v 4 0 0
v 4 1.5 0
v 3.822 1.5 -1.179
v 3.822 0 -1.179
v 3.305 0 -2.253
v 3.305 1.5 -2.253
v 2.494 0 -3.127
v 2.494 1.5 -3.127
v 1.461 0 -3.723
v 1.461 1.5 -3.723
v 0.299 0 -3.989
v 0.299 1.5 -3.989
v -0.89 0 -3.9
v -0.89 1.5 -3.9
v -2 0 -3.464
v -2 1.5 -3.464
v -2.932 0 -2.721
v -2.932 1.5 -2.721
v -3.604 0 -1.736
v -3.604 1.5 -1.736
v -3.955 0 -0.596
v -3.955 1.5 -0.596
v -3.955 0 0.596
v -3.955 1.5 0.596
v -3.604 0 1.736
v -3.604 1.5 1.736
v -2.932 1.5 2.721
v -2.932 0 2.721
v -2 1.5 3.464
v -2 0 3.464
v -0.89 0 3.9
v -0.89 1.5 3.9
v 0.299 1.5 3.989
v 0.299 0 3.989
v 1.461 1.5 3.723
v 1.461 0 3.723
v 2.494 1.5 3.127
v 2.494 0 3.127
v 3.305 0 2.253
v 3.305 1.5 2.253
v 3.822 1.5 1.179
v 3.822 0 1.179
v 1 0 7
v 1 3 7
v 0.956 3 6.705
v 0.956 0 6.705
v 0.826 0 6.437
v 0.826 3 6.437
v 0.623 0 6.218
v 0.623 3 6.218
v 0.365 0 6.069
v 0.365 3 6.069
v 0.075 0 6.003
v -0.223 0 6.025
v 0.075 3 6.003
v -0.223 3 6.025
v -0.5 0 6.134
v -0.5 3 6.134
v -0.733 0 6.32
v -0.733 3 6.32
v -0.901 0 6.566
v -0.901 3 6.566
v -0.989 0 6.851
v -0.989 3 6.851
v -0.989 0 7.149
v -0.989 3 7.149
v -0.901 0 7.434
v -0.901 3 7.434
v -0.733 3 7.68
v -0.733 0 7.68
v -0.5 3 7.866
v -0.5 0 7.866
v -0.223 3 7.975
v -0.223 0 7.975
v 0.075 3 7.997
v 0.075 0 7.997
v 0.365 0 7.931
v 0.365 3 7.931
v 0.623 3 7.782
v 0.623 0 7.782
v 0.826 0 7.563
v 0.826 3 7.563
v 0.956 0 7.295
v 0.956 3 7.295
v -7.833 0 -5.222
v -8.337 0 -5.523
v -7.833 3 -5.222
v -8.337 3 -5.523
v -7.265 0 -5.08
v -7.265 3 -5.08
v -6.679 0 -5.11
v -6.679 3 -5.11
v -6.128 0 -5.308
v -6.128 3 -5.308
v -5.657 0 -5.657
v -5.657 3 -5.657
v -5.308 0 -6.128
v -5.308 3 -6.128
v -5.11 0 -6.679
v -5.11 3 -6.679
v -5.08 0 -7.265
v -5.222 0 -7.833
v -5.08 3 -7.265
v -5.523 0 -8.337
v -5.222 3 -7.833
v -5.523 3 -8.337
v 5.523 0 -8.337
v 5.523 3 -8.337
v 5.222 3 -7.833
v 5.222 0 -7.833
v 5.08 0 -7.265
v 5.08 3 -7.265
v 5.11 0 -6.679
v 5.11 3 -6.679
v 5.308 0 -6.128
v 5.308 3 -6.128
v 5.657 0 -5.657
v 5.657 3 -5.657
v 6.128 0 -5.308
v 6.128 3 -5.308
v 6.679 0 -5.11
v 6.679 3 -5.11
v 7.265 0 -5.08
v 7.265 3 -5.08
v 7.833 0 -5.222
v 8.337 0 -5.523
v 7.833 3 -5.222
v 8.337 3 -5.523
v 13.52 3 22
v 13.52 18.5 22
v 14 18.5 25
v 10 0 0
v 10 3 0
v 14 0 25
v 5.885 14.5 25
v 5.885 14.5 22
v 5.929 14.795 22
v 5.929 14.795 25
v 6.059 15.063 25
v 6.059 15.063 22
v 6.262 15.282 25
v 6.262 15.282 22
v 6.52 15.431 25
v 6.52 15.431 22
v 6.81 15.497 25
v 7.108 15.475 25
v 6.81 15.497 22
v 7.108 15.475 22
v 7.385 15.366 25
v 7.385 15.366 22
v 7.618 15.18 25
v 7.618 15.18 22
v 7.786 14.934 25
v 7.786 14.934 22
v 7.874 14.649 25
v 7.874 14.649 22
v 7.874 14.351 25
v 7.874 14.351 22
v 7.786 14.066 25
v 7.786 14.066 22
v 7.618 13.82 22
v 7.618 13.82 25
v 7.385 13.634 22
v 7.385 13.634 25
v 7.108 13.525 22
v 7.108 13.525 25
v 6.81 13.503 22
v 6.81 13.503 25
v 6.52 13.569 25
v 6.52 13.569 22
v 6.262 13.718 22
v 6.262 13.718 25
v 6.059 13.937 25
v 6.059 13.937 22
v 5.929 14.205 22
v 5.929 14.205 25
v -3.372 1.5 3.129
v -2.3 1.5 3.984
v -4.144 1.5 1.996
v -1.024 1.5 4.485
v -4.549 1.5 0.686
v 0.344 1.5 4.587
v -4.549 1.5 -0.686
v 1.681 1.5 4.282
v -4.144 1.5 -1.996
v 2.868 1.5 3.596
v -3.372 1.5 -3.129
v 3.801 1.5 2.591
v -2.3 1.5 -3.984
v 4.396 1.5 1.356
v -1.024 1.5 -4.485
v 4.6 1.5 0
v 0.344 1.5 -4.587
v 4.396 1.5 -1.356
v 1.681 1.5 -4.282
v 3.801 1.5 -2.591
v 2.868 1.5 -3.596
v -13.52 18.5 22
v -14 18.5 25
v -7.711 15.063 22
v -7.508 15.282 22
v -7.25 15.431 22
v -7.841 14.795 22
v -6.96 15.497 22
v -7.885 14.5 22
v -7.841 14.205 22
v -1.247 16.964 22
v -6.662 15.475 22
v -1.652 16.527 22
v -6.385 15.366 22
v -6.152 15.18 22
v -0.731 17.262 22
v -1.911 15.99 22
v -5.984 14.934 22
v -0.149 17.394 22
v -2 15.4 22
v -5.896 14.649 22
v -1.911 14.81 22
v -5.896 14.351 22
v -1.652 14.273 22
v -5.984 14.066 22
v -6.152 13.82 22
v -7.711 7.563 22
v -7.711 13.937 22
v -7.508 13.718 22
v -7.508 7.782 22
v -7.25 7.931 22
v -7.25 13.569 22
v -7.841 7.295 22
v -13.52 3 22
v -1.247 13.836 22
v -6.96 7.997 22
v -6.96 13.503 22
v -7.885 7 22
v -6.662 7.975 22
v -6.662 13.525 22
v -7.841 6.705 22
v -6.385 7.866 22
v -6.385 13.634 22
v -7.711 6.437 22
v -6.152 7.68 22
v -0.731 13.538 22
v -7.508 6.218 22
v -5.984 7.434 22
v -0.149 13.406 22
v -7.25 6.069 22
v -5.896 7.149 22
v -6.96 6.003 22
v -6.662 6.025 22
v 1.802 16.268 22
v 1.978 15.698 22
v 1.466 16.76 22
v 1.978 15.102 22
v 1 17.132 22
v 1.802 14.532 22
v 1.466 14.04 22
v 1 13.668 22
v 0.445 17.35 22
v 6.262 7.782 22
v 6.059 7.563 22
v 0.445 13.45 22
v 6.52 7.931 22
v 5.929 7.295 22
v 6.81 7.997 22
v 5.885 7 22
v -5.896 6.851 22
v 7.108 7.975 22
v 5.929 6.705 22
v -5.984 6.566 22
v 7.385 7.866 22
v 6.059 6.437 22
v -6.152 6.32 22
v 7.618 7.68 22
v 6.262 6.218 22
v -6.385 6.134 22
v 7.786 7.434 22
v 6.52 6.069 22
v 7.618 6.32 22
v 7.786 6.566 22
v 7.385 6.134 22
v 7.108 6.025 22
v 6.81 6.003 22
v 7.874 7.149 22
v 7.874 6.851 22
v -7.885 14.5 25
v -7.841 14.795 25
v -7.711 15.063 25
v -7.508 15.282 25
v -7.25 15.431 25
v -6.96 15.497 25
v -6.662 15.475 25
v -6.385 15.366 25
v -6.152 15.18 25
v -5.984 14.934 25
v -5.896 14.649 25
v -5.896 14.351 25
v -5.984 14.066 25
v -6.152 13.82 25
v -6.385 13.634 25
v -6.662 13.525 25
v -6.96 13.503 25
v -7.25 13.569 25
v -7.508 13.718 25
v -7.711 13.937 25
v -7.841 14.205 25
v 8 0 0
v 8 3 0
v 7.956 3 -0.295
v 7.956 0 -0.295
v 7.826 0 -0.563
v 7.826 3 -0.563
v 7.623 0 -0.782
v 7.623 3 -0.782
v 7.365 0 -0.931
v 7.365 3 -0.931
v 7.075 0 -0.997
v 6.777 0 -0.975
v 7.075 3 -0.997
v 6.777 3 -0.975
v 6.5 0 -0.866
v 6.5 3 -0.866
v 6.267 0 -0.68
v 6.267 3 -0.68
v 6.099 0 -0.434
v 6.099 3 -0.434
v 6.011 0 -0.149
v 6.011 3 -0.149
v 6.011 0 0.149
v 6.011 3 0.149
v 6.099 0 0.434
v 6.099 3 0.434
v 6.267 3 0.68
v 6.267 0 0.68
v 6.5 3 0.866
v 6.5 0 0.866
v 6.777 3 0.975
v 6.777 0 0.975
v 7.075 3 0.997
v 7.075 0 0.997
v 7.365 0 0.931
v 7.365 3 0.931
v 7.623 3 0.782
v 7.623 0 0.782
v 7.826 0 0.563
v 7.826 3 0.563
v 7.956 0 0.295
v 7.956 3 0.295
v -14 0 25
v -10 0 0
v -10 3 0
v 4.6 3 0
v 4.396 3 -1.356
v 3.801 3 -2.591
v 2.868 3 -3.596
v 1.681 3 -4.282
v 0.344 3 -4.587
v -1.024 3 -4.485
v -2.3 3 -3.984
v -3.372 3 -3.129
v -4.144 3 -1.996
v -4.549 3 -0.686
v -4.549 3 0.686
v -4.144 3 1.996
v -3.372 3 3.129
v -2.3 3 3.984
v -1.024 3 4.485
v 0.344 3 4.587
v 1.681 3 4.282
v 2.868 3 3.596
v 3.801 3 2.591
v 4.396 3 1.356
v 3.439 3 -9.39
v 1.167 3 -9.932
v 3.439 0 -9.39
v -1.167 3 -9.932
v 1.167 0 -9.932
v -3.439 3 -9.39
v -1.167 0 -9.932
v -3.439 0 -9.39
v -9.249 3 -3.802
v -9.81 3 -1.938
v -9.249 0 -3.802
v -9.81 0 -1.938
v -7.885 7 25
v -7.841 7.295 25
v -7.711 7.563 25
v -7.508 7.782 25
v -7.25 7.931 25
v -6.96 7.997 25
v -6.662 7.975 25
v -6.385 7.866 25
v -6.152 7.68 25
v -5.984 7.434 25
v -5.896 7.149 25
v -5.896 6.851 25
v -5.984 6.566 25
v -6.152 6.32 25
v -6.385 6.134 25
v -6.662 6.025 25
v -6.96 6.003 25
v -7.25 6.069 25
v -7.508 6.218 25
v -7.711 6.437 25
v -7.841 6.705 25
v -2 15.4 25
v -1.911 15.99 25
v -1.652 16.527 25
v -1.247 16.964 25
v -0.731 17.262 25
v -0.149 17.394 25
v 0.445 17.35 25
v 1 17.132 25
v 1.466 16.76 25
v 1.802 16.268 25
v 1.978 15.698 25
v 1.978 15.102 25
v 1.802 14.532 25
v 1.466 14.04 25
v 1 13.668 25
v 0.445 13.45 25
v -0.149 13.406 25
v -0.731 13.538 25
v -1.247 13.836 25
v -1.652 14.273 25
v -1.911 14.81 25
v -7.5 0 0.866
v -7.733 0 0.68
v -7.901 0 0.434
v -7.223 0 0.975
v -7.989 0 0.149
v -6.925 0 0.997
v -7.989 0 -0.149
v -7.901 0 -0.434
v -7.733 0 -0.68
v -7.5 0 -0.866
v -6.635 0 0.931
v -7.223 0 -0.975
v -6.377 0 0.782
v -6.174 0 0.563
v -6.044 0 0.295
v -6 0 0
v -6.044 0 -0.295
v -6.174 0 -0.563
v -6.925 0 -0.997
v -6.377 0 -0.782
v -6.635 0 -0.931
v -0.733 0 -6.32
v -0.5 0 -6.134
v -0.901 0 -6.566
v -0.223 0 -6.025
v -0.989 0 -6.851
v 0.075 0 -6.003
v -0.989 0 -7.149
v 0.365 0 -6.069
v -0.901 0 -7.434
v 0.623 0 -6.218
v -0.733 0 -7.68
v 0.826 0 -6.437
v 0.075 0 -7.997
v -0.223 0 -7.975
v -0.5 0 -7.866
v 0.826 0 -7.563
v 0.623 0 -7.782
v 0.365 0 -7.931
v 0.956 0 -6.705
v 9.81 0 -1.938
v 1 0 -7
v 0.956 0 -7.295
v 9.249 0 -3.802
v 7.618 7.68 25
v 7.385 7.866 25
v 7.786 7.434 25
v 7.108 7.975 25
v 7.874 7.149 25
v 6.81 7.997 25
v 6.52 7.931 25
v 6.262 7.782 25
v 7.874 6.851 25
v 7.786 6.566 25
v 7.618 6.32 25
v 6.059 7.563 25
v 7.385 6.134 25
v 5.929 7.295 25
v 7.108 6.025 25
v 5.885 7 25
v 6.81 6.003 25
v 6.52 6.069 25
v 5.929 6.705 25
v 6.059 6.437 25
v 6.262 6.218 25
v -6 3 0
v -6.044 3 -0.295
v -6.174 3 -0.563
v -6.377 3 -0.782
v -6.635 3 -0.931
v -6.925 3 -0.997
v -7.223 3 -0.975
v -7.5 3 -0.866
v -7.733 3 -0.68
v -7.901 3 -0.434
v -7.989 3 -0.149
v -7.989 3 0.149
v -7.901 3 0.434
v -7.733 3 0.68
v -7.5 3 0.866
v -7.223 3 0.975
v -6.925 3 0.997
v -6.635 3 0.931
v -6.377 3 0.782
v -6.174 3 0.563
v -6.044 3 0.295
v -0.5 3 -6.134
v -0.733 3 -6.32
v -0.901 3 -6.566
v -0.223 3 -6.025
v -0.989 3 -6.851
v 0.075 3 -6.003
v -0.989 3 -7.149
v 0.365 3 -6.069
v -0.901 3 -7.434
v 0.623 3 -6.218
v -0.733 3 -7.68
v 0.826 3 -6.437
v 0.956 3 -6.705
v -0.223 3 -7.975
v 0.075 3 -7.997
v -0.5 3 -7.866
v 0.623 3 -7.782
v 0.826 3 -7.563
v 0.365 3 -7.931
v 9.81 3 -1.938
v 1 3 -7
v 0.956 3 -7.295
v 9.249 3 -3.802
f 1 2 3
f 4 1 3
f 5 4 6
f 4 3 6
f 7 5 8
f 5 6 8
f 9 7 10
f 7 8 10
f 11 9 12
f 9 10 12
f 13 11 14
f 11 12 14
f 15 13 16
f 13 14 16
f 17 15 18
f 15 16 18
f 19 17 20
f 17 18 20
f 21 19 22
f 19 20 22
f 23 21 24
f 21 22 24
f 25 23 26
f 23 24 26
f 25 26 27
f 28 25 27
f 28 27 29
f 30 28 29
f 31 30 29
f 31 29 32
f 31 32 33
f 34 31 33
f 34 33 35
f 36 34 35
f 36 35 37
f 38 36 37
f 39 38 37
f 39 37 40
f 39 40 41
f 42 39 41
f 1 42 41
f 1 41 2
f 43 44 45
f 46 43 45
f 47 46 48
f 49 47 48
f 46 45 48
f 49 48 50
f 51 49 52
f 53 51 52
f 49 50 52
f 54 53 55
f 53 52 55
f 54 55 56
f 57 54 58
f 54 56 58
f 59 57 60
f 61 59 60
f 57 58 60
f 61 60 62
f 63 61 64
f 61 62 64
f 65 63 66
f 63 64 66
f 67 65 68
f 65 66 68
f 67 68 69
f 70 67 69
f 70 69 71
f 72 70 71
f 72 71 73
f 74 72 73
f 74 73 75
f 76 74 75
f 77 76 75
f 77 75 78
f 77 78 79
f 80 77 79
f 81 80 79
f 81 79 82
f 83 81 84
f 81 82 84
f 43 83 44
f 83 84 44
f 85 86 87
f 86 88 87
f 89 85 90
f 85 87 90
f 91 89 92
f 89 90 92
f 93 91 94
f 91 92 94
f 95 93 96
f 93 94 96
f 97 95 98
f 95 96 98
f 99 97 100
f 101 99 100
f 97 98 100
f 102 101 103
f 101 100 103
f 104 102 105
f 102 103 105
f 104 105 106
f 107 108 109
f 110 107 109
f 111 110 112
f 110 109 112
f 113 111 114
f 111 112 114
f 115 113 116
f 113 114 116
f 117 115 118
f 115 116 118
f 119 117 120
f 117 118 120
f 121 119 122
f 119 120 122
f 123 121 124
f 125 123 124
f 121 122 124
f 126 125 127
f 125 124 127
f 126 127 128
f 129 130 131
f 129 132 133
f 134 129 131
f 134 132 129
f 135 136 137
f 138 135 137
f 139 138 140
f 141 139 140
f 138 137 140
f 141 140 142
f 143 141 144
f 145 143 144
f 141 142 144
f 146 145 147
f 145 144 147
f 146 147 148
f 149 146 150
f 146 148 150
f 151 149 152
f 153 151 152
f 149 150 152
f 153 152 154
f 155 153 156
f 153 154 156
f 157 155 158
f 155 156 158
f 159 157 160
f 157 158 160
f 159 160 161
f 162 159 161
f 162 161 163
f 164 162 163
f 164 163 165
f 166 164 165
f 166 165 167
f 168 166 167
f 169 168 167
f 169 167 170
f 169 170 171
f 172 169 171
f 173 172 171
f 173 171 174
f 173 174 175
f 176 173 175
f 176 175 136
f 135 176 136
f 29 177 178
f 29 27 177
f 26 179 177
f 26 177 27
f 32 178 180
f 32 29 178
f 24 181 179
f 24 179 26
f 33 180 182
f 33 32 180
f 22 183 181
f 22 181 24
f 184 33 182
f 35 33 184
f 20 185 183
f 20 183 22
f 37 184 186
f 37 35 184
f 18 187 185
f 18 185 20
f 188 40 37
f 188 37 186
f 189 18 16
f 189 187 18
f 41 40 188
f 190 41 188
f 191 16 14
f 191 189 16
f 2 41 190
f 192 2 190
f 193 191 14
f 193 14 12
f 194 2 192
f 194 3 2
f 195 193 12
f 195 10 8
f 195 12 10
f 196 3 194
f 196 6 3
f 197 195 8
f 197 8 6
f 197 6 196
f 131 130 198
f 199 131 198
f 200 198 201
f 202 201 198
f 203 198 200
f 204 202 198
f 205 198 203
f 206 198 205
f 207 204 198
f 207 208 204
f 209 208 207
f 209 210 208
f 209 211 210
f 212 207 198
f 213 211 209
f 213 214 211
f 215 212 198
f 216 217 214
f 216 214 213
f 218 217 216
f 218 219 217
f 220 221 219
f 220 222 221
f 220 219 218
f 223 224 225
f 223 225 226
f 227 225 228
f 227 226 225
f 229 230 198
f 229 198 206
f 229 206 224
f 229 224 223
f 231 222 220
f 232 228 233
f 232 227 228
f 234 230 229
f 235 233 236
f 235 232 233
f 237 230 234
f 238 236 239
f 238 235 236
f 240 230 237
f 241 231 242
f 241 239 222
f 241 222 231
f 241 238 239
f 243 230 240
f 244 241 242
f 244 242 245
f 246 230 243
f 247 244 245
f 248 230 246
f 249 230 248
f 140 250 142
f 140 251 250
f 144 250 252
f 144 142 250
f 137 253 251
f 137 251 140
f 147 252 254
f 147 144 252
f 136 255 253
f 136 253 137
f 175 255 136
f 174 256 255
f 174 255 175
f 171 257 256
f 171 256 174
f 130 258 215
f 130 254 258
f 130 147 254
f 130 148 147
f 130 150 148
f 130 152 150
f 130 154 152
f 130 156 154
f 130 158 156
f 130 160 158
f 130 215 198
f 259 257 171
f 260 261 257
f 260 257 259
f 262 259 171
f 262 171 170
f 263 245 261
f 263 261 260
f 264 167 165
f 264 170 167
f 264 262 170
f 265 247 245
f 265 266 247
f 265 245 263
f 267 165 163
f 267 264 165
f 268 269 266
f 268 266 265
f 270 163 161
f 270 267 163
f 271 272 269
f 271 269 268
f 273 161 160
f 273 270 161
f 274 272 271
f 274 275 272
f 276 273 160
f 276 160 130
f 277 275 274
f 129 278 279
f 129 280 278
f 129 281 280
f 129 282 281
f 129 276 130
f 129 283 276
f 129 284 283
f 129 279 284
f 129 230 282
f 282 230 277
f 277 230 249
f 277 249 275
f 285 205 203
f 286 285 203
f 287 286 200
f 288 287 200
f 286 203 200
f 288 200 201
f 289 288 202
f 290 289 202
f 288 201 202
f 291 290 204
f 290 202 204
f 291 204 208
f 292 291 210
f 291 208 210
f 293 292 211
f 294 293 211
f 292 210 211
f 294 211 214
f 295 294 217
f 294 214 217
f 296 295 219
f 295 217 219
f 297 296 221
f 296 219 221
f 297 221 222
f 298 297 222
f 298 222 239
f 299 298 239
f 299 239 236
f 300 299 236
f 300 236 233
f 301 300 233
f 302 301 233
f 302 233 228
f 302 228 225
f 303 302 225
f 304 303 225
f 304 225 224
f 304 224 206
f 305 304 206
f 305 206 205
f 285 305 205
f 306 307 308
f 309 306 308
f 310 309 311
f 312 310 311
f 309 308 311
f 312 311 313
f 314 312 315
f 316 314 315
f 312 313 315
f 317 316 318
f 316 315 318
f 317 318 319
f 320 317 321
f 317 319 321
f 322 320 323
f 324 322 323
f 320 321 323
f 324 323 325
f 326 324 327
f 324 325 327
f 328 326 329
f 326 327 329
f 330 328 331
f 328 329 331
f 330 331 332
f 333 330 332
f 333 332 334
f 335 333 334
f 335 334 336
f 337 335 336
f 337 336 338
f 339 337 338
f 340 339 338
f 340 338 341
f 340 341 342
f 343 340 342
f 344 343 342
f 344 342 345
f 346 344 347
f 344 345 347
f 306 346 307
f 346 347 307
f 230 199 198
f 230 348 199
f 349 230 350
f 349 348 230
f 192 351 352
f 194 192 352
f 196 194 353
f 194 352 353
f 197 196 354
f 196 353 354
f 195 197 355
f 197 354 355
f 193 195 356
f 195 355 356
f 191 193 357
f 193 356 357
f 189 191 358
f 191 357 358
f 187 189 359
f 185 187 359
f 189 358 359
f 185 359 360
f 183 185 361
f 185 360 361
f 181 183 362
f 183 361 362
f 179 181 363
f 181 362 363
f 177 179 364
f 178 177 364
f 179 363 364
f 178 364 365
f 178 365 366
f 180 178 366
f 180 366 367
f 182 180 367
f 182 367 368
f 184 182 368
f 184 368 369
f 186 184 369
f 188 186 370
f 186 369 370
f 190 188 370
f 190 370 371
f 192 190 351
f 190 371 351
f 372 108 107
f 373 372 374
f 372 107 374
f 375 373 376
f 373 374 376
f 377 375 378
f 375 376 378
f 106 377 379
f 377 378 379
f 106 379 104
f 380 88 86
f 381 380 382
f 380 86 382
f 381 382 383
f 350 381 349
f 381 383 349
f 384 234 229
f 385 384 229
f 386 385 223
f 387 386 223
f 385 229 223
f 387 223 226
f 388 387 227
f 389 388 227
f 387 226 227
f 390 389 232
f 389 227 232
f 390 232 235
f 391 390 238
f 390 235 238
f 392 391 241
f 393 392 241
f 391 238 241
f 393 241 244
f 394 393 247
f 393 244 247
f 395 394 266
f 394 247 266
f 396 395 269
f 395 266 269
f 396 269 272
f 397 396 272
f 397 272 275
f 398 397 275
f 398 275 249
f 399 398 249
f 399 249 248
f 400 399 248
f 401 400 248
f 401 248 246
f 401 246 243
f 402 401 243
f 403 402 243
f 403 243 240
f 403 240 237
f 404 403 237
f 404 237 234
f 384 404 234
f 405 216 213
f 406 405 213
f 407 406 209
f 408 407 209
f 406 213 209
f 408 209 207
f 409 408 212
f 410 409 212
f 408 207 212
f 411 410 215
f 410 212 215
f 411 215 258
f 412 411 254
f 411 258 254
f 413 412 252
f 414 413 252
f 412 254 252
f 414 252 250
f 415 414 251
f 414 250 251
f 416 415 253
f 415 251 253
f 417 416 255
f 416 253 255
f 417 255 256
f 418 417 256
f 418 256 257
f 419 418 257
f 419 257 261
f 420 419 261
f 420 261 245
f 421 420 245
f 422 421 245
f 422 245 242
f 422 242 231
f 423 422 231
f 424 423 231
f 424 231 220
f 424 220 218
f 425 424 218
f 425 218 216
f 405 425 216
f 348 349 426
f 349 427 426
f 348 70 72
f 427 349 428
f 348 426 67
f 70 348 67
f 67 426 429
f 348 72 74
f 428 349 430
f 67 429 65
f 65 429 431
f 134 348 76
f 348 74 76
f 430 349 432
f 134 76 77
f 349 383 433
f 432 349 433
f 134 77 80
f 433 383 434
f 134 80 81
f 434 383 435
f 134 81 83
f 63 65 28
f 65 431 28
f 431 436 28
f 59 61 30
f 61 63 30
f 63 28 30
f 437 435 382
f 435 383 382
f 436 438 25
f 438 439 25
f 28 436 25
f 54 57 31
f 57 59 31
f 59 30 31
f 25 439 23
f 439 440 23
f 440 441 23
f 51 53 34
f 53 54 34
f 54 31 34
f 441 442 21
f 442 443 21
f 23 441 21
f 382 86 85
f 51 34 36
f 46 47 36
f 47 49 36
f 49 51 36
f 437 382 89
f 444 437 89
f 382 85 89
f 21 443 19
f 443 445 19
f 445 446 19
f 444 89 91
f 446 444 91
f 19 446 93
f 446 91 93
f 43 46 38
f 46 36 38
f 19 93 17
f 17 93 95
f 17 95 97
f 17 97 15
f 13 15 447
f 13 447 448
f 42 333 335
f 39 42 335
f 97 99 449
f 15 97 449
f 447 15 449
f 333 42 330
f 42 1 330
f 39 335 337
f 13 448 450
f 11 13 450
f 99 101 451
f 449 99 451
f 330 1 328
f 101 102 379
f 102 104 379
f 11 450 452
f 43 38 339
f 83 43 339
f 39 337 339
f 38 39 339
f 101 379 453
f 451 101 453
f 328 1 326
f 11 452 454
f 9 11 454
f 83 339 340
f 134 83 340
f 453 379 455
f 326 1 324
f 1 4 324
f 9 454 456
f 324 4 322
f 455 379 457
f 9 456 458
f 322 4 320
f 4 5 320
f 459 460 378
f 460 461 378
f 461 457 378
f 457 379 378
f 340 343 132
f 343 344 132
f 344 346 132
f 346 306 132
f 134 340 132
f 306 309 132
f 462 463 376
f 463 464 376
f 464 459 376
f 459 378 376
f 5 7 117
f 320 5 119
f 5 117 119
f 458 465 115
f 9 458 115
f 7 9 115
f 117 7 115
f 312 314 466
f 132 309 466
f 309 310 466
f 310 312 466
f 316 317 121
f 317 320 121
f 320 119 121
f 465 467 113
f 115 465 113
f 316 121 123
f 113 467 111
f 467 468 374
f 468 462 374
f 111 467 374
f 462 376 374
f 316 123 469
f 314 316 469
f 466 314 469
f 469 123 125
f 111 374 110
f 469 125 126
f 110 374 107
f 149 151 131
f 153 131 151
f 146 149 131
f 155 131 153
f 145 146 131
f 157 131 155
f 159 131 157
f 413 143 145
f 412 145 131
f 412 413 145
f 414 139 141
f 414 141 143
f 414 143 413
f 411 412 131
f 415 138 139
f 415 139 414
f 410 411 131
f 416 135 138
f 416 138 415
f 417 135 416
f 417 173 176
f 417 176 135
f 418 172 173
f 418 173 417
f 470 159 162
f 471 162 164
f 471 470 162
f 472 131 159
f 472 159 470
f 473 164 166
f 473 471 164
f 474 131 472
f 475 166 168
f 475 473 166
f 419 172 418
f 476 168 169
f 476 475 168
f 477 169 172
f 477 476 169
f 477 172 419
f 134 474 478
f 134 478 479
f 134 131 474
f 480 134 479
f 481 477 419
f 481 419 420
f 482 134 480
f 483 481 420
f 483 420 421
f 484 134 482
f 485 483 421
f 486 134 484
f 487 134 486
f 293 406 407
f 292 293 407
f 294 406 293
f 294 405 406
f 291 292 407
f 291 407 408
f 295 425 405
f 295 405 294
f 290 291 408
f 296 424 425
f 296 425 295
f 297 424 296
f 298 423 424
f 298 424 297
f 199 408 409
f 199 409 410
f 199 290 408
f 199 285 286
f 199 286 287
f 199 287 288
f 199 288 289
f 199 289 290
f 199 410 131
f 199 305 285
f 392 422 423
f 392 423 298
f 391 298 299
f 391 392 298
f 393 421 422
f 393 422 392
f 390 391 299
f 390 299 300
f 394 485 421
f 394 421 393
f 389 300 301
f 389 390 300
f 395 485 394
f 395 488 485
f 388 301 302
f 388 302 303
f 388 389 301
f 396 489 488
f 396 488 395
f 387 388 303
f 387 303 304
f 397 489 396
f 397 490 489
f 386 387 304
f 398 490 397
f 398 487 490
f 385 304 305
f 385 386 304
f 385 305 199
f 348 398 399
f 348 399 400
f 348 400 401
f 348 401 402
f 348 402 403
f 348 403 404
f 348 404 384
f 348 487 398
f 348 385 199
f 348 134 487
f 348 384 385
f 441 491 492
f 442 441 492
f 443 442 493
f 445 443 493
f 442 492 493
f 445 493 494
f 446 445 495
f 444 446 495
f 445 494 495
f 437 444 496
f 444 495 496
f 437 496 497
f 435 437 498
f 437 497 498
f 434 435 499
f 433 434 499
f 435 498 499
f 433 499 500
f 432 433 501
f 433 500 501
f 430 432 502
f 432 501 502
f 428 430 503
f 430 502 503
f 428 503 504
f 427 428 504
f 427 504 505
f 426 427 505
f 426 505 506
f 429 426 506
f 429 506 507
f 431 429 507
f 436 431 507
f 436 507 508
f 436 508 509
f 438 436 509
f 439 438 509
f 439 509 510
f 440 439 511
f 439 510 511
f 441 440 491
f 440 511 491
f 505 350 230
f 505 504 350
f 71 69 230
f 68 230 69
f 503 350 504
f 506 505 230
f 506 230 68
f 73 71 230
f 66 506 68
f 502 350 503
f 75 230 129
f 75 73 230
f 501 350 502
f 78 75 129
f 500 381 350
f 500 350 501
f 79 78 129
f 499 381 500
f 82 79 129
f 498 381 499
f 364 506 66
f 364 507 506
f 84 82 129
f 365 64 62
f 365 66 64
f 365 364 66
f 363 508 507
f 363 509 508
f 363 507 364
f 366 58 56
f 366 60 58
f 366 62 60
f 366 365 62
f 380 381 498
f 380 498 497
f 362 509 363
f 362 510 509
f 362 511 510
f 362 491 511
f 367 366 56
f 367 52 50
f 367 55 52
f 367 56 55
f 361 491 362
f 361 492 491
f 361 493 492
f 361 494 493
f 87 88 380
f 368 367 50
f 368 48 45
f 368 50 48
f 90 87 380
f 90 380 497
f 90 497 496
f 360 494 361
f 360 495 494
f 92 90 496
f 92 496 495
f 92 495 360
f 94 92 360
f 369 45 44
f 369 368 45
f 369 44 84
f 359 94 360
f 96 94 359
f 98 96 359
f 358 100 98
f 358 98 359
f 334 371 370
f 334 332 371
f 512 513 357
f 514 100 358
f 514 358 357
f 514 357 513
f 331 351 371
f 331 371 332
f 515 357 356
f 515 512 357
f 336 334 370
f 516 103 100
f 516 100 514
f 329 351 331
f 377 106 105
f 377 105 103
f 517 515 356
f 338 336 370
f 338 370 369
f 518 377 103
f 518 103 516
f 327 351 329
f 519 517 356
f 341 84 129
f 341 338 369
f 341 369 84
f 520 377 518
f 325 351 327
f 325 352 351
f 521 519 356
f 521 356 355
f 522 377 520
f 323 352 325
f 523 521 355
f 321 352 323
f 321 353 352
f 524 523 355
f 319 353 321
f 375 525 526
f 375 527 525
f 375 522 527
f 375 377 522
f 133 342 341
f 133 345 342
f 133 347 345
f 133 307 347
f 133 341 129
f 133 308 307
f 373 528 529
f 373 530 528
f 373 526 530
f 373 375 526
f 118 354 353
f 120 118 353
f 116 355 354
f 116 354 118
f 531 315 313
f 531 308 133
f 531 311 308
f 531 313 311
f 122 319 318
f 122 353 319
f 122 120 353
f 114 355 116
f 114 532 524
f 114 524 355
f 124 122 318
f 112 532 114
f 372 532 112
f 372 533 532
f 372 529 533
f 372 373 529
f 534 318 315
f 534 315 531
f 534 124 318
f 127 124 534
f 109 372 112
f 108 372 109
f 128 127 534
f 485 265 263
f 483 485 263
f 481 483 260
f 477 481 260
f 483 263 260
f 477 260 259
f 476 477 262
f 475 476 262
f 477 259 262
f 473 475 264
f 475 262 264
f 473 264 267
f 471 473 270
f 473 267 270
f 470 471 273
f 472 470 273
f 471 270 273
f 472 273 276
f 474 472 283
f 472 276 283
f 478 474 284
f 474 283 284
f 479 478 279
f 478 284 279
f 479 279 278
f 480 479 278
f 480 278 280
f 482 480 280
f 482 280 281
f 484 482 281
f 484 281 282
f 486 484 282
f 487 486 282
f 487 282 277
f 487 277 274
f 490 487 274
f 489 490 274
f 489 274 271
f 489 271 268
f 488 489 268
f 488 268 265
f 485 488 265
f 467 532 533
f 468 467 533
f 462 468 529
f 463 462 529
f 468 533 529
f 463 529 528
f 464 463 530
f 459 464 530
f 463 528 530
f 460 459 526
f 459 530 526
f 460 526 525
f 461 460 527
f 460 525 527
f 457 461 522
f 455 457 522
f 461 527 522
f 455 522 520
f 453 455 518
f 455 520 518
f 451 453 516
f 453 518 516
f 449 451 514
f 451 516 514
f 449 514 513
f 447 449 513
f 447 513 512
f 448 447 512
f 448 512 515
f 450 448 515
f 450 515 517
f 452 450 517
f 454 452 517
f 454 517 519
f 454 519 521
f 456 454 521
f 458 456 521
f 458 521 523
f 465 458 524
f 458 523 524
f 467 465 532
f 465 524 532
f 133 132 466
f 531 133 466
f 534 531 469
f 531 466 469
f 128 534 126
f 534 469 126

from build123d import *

# Parameters (mm, degrees)
BOSS_EXTRUDE1_DEPTH = 3
SKETCH2_R           = 4
CUT_EXTRUDE1_DEPTH  = 13
SKETCH4_R           = 1
CUT_EXTRUDE3_DEPTH  = 3
BOSS_EXTRUDE2_DEPTH = 15.5
SKETCH6_R           = 4.6
CUT_EXTRUDE4_DEPTH  = 1.5
SKETCH7_R           = 2
CUT_EXTRUDE5_DEPTH  = 10
SKETCH8_R           = 1
CUT_EXTRUDE6_DEPTH  = 10
SKETCH9_R           = 2
CUT_EXTRUDE7_DEPTH  = 10


with BuildPart() as part:
    # Sketch1 → Boss-Extrude1 (new body)
    with BuildSketch(Plane(origin=(0, 0, 0), x_dir=(1, 0, 0), z_dir=(0, 1, 0))):
        with BuildLine():
            Line((-10, 0), (-14, -25))
            Line((-14, -25), (14, -25))
            Line((14, -25), (10, 0))
            ThreePointArc((10, 0), (0, 10), (-10, 0))
        make_face()
    extrude(amount=BOSS_EXTRUDE1_DEPTH)

    # Sketch2 → Cut-Extrude1 (cut)
    with BuildSketch(Plane(origin=(0, 3, 0), x_dir=(1, 0, 0), z_dir=(0, 1, 0))):
        Circle(SKETCH2_R)
    extrude(amount=-CUT_EXTRUDE1_DEPTH, mode=Mode.SUBTRACT)

    # Sketch4 → Cut-Extrude3 (cut)
    with BuildSketch(Plane(origin=(0, 3, 0), x_dir=(1, 0, 0), z_dir=(0, 1, 0))):
        with Locations((0, -7)):
            Circle(SKETCH4_R)
        with Locations((-7, 0)):
            Circle(SKETCH4_R)
        with Locations((0, 7)):
            Circle(SKETCH4_R)
        with Locations((7, 0)):
            Circle(SKETCH4_R)
    extrude(amount=-CUT_EXTRUDE3_DEPTH, mode=Mode.SUBTRACT)

    # Sketch5 → Boss-Extrude2 (add)
    with BuildSketch(Plane(origin=(0, 3, 0), x_dir=(1, 0, 0), z_dir=(0, 1, 0))):
        Polygon((-13.52, -22), (13.52, -22), (14, -25), (-14, -25), align=None)
    extrude(amount=BOSS_EXTRUDE2_DEPTH)

    # Sketch6 → Cut-Extrude4 (cut)
    with BuildSketch(Plane(origin=(0, 3, 0), x_dir=(1, 0, 0), z_dir=(0, 1, 0))):
        Circle(SKETCH6_R)
    extrude(amount=-CUT_EXTRUDE4_DEPTH, mode=Mode.SUBTRACT)

    # Sketch7 → Cut-Extrude5 (cut)
    with BuildSketch(Plane(origin=(0, 3, 0), x_dir=(1, 0, 0), z_dir=(0, 1, 0))):
        with Locations((-7.071067812, 7.071067812)):
            Circle(SKETCH7_R)
        with Locations((7.071067812, 7.071067812)):
            Circle(SKETCH7_R)
    extrude(amount=-CUT_EXTRUDE5_DEPTH, mode=Mode.SUBTRACT)

    # Sketch8 → Cut-Extrude6 (cut)
    with BuildSketch(Plane(origin=(0, 0, 22), x_dir=(-1, 0, 0), z_dir=(0, 0, -1))):
        with Locations((6.885, 7)):
            Circle(SKETCH8_R)
        with Locations((-6.885, 7)):
            Circle(SKETCH8_R)
        with Locations((6.885, 14.5)):
            Circle(SKETCH8_R)
        with Locations((-6.885, 14.5)):
            Circle(SKETCH8_R)
    extrude(amount=-CUT_EXTRUDE6_DEPTH, mode=Mode.SUBTRACT)

    # Sketch9 → Cut-Extrude7 (cut)
    with BuildSketch(Plane(origin=(0, 0, 22), x_dir=(-1, 0, 0), z_dir=(0, 0, -1))):
        with Locations((0, 15.4)):
            Circle(SKETCH9_R)
    extrude(amount=-CUT_EXTRUDE7_DEPTH, mode=Mode.SUBTRACT)


solid = part.part
